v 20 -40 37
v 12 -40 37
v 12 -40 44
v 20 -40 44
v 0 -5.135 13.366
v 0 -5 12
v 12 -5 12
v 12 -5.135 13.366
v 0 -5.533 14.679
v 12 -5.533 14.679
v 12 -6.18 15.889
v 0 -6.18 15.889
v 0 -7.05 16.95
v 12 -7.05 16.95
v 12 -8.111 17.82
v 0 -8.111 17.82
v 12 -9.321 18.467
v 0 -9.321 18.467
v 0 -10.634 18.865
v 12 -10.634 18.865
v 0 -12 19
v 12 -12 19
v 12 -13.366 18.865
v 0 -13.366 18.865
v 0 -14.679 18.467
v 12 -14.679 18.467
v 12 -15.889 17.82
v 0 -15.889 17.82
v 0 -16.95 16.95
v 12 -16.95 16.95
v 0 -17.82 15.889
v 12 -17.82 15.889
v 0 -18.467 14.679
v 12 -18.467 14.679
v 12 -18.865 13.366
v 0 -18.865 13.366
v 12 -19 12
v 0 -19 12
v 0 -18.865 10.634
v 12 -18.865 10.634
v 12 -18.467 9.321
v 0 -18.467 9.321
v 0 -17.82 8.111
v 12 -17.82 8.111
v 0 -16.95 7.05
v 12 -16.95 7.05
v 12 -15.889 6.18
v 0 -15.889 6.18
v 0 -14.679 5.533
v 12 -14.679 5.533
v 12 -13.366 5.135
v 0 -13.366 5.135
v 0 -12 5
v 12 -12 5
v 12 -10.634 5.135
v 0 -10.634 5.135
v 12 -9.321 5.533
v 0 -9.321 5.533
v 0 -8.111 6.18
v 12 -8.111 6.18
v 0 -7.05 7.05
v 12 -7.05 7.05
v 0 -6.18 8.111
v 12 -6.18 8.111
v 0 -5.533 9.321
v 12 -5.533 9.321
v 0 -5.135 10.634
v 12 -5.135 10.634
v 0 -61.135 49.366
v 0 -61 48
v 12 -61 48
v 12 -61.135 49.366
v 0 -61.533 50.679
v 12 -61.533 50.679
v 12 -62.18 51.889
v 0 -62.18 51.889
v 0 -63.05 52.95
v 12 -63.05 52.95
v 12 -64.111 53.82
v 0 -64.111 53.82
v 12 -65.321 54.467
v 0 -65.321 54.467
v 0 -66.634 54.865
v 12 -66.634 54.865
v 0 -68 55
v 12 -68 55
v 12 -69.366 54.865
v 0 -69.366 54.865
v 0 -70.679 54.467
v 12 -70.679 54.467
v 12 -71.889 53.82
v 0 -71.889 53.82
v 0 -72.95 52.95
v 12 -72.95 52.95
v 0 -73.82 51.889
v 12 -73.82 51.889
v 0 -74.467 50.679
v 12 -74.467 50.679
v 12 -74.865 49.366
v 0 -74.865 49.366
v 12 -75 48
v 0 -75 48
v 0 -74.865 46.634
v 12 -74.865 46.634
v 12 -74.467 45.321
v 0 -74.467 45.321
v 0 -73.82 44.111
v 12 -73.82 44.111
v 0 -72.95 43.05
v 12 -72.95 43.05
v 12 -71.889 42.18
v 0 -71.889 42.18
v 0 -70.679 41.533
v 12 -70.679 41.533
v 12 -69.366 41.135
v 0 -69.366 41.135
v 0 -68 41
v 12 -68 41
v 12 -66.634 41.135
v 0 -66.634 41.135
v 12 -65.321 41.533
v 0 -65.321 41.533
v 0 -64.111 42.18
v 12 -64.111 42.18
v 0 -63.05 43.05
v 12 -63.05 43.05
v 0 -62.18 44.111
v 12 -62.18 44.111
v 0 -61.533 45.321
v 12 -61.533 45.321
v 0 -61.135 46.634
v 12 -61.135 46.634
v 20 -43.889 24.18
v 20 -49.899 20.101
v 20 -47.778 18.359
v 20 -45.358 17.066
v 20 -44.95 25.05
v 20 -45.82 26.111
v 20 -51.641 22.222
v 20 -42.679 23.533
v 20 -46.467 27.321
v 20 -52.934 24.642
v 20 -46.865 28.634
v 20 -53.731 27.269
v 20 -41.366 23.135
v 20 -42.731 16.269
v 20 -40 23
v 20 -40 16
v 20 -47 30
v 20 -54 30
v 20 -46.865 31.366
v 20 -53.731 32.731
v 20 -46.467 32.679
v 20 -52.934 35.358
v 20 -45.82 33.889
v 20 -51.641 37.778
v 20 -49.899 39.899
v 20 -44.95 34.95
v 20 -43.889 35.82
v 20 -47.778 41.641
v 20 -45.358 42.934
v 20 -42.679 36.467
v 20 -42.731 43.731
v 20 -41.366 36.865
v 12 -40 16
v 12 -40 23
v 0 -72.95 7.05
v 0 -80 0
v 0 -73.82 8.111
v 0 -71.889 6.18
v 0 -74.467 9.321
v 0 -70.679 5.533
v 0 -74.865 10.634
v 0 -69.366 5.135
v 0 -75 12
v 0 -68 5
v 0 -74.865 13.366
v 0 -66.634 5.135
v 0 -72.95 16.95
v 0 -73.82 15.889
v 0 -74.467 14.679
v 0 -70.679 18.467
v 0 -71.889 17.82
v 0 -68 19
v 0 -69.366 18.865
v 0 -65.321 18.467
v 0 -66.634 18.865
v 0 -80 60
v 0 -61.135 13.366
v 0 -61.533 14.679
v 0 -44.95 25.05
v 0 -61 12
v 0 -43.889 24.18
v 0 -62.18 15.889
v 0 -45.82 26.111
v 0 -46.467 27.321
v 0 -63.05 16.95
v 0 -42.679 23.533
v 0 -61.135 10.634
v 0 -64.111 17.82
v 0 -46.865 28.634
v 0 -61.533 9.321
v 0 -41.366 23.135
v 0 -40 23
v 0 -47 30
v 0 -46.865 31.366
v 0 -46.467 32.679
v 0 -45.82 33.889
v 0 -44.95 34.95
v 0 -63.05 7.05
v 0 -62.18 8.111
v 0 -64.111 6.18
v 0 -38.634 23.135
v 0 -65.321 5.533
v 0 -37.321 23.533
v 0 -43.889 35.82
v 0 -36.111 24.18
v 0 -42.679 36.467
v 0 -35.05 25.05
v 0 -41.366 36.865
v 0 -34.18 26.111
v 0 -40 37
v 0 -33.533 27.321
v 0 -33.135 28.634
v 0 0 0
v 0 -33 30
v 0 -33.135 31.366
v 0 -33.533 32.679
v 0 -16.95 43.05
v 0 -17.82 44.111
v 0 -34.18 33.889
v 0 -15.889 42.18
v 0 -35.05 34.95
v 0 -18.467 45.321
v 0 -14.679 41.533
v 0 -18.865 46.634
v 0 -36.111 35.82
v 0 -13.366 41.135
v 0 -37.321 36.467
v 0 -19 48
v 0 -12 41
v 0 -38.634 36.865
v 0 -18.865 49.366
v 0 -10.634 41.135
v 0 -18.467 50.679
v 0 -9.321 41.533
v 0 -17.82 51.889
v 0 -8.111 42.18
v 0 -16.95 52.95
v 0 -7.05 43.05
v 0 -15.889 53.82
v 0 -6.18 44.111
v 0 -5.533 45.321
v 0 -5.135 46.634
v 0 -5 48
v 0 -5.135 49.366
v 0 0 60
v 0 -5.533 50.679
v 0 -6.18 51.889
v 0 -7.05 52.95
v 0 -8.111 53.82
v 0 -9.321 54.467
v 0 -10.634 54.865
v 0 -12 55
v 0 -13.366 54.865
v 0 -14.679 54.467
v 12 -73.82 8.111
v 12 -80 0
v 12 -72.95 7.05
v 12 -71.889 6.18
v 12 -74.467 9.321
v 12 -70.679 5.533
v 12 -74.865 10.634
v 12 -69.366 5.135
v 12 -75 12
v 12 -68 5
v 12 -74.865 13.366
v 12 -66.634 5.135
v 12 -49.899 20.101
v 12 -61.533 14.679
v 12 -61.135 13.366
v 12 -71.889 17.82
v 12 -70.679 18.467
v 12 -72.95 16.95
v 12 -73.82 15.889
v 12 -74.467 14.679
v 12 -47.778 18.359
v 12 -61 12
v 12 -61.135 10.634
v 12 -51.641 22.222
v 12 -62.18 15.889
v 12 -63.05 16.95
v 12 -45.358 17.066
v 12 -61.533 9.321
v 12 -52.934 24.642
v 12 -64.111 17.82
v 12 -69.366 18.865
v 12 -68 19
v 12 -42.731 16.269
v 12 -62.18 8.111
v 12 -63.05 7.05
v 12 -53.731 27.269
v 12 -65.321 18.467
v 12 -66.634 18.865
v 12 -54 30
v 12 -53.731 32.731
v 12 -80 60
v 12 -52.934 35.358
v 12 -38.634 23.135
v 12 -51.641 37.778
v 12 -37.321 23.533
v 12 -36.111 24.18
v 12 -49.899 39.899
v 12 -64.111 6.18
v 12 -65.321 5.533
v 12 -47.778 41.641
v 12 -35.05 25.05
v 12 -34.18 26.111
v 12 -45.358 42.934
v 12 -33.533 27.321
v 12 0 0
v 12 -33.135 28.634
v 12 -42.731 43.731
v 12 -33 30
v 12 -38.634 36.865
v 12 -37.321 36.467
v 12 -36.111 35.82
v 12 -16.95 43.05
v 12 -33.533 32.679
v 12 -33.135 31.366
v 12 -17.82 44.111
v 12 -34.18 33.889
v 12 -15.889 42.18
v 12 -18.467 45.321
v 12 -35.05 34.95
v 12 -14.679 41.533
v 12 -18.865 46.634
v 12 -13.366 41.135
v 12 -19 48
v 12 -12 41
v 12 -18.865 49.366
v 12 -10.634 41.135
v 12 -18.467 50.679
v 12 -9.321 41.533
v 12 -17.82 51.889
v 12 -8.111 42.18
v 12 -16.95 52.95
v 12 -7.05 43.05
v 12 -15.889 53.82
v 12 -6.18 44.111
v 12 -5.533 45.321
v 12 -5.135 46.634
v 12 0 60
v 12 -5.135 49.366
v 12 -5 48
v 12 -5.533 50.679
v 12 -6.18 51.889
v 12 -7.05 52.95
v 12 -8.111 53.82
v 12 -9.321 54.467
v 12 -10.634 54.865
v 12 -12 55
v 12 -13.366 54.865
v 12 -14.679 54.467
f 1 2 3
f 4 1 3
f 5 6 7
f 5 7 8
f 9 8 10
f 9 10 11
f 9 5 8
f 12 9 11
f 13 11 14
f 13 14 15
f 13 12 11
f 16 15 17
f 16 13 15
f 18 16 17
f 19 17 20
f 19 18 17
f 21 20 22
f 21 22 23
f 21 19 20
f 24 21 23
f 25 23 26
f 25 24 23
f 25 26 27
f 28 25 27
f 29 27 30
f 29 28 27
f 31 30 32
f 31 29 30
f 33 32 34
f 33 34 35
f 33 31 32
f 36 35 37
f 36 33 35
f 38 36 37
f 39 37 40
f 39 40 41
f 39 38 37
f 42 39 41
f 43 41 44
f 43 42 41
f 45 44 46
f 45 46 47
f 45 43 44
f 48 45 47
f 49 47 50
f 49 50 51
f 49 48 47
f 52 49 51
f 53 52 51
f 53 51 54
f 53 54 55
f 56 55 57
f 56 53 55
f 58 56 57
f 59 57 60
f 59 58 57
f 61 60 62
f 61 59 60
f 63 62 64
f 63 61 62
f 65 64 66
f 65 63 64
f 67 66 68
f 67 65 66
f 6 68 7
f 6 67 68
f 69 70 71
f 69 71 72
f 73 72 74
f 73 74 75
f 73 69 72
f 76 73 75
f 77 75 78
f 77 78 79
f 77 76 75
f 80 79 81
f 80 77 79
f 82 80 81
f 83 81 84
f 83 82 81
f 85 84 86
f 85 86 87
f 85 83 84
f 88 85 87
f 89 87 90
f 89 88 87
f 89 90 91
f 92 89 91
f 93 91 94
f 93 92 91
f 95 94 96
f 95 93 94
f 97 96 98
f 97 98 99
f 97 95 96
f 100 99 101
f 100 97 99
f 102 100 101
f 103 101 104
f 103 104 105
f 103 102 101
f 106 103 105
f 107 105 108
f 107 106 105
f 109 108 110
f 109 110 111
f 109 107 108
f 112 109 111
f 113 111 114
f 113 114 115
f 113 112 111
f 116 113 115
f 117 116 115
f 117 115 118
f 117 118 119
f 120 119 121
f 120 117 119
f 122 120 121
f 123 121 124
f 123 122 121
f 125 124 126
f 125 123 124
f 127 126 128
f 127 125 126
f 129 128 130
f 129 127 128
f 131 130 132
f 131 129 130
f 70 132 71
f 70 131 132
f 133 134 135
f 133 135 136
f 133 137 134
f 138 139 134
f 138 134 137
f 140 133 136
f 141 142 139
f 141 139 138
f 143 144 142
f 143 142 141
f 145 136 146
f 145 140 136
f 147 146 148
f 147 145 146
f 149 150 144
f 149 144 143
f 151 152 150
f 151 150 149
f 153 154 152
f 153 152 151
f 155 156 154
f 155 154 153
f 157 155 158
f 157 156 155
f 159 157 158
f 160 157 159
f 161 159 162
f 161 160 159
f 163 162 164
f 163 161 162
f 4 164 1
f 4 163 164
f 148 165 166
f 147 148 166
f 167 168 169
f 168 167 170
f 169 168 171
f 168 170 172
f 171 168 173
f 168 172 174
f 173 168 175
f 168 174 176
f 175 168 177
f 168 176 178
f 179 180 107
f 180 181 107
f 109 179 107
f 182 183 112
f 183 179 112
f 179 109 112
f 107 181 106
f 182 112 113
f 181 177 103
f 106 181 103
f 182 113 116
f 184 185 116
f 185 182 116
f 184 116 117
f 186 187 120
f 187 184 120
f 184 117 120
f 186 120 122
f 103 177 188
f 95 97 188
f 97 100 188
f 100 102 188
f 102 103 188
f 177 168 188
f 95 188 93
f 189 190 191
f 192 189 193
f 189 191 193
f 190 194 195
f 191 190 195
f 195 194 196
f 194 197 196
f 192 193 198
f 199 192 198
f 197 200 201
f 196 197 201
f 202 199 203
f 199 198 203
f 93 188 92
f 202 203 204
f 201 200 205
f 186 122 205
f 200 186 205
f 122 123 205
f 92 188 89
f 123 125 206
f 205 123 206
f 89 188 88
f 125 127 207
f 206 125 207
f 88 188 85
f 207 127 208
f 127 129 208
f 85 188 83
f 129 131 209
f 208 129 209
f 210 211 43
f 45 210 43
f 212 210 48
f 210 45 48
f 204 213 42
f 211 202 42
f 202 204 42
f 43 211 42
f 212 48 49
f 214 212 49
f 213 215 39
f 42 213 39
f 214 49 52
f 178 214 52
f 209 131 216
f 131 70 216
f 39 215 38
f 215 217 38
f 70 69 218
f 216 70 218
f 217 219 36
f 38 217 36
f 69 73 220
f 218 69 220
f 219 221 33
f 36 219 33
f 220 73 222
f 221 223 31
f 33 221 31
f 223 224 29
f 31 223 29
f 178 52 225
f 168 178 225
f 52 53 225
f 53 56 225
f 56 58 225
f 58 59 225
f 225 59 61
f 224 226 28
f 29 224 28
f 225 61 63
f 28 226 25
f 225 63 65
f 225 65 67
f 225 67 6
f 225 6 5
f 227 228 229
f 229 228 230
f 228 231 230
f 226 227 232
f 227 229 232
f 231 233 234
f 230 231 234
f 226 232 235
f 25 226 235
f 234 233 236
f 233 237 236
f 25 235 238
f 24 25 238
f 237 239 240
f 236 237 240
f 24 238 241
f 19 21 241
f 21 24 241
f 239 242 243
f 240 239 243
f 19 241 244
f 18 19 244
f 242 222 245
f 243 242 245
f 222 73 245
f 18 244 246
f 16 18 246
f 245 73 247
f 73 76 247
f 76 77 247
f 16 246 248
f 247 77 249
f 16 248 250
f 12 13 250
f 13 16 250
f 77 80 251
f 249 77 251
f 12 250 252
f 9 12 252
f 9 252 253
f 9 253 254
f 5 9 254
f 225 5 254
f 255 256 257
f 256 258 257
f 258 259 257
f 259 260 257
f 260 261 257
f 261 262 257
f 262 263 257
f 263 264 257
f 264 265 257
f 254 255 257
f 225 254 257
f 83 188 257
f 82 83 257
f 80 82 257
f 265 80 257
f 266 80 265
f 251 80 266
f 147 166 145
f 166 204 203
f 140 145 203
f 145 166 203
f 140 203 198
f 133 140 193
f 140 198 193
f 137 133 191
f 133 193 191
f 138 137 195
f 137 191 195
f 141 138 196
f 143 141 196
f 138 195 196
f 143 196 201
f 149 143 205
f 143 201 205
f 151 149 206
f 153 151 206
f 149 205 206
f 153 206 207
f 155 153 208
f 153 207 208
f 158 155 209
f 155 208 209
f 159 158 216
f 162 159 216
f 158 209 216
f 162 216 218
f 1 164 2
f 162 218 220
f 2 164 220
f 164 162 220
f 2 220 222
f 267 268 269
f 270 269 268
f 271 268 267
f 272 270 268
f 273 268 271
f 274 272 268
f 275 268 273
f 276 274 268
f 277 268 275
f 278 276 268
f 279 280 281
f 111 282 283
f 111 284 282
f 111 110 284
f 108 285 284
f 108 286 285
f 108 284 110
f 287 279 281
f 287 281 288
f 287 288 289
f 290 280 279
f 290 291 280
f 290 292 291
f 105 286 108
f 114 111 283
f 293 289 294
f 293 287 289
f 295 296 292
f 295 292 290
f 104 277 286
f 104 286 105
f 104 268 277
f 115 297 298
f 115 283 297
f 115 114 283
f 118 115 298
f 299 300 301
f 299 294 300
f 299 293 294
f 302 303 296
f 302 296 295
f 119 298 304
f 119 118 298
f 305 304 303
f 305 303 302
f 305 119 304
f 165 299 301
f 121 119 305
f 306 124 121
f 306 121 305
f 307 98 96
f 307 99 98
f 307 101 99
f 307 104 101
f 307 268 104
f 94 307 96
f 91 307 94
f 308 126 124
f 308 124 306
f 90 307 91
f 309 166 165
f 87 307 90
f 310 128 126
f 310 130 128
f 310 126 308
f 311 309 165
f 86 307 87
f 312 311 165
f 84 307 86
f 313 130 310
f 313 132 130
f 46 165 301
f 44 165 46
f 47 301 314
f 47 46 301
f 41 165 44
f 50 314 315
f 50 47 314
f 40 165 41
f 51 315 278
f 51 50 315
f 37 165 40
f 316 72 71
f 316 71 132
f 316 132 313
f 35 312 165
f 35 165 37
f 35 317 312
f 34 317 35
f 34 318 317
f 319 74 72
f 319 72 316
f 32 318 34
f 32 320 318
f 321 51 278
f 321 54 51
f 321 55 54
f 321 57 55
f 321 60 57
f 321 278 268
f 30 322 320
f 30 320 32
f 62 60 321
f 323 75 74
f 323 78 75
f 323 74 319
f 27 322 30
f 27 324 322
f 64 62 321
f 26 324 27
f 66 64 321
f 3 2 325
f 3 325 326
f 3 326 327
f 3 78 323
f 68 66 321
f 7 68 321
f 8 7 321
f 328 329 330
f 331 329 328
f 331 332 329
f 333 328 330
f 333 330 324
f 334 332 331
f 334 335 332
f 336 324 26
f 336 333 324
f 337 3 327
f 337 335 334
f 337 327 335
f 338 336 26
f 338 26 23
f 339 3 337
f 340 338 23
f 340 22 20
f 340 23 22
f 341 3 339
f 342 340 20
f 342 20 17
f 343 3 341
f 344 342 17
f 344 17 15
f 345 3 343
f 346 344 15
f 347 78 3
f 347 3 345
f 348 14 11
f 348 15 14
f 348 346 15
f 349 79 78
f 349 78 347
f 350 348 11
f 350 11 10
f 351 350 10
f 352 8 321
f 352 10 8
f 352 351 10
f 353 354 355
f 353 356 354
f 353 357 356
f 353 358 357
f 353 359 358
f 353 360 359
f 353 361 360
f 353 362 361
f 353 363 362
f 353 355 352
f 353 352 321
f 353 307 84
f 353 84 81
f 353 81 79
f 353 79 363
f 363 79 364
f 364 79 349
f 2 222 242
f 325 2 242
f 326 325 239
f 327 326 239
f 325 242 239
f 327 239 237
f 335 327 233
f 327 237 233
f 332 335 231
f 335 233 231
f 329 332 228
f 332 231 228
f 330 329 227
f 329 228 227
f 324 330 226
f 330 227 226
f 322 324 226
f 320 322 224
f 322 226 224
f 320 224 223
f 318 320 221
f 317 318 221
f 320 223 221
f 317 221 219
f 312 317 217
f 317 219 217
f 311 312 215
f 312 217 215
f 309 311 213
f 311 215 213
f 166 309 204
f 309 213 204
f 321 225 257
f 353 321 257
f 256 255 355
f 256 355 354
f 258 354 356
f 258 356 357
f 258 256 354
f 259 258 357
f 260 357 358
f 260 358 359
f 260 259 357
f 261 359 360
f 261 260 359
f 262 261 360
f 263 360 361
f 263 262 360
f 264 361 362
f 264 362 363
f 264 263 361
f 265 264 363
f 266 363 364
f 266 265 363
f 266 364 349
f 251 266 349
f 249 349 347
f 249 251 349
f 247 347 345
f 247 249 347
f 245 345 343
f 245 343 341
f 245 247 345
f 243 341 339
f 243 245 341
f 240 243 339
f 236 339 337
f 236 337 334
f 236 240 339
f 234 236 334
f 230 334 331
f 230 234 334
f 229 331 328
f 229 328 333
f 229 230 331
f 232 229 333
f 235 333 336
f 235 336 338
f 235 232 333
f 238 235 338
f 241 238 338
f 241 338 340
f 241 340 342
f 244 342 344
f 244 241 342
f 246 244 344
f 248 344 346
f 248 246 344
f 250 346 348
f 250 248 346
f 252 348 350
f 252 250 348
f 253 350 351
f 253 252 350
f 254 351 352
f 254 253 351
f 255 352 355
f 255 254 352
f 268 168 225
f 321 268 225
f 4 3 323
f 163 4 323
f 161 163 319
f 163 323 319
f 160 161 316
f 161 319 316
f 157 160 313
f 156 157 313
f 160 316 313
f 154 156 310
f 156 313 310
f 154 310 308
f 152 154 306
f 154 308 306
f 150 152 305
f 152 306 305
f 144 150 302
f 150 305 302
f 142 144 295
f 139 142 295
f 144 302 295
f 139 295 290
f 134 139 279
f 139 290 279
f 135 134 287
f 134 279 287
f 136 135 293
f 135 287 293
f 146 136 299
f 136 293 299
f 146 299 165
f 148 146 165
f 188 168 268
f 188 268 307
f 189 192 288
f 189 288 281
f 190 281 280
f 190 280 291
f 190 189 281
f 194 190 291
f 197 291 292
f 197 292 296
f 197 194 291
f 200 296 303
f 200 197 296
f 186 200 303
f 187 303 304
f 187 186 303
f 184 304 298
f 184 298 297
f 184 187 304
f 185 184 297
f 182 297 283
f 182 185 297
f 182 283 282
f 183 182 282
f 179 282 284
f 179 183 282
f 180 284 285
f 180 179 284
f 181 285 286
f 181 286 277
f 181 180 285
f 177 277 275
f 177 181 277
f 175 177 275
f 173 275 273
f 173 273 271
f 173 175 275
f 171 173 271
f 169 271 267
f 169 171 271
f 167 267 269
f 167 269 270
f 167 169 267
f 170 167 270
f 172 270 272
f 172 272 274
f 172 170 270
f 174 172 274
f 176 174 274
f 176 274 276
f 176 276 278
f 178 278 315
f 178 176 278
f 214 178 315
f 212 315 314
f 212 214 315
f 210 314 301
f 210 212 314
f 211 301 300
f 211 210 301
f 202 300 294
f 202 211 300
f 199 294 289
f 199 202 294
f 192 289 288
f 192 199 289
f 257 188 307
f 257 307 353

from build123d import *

# Parameters (mm, degrees)
F0_W     = 80
F0_H     = 60
F0_R     = 7
F1_DEPTH = 12
F2_DEPTH = 20


with BuildPart() as f1:
    # F0 (on Right) → F1 (new body)
    with BuildSketch(Plane.YZ):
        with Locations((-40, 30)):
            Rectangle(F0_W, F0_H)
        with Locations((-68, 12)):
            Circle(F0_R, mode=Mode.SUBTRACT)
        with Locations((-12, 12)):
            Circle(F0_R, mode=Mode.SUBTRACT)
        with BuildLine():
            ThreePointArc((-40, 37), (-35.050253, 34.949747), (-33, 30))
            ThreePointArc((-33, 30), (-35.050253, 25.050253), (-40, 23))
            Line((-40, 23), (-40, 16))
            ThreePointArc((-40, 16), (-54, 30), (-40, 44))
            Line((-40, 44), (-40, 37))
        make_face(mode=Mode.SUBTRACT)
        with Locations((-68, 48)):
            Circle(F0_R, mode=Mode.SUBTRACT)
        with Locations((-12, 48)):
            Circle(F0_R, mode=Mode.SUBTRACT)
    extrude(amount=F1_DEPTH)

    # F0 (on Right) → F2 (join)
    with BuildSketch(Plane.YZ):
        with BuildLine():
            ThreePointArc((-40, 23), (-47, 30), (-40, 37))
            Line((-40, 37), (-40, 44))
            ThreePointArc((-40, 44), (-54, 30), (-40, 16))
            Line((-40, 16), (-40, 23))
        make_face()
    extrude(amount=F2_DEPTH)


solid = f1.part
